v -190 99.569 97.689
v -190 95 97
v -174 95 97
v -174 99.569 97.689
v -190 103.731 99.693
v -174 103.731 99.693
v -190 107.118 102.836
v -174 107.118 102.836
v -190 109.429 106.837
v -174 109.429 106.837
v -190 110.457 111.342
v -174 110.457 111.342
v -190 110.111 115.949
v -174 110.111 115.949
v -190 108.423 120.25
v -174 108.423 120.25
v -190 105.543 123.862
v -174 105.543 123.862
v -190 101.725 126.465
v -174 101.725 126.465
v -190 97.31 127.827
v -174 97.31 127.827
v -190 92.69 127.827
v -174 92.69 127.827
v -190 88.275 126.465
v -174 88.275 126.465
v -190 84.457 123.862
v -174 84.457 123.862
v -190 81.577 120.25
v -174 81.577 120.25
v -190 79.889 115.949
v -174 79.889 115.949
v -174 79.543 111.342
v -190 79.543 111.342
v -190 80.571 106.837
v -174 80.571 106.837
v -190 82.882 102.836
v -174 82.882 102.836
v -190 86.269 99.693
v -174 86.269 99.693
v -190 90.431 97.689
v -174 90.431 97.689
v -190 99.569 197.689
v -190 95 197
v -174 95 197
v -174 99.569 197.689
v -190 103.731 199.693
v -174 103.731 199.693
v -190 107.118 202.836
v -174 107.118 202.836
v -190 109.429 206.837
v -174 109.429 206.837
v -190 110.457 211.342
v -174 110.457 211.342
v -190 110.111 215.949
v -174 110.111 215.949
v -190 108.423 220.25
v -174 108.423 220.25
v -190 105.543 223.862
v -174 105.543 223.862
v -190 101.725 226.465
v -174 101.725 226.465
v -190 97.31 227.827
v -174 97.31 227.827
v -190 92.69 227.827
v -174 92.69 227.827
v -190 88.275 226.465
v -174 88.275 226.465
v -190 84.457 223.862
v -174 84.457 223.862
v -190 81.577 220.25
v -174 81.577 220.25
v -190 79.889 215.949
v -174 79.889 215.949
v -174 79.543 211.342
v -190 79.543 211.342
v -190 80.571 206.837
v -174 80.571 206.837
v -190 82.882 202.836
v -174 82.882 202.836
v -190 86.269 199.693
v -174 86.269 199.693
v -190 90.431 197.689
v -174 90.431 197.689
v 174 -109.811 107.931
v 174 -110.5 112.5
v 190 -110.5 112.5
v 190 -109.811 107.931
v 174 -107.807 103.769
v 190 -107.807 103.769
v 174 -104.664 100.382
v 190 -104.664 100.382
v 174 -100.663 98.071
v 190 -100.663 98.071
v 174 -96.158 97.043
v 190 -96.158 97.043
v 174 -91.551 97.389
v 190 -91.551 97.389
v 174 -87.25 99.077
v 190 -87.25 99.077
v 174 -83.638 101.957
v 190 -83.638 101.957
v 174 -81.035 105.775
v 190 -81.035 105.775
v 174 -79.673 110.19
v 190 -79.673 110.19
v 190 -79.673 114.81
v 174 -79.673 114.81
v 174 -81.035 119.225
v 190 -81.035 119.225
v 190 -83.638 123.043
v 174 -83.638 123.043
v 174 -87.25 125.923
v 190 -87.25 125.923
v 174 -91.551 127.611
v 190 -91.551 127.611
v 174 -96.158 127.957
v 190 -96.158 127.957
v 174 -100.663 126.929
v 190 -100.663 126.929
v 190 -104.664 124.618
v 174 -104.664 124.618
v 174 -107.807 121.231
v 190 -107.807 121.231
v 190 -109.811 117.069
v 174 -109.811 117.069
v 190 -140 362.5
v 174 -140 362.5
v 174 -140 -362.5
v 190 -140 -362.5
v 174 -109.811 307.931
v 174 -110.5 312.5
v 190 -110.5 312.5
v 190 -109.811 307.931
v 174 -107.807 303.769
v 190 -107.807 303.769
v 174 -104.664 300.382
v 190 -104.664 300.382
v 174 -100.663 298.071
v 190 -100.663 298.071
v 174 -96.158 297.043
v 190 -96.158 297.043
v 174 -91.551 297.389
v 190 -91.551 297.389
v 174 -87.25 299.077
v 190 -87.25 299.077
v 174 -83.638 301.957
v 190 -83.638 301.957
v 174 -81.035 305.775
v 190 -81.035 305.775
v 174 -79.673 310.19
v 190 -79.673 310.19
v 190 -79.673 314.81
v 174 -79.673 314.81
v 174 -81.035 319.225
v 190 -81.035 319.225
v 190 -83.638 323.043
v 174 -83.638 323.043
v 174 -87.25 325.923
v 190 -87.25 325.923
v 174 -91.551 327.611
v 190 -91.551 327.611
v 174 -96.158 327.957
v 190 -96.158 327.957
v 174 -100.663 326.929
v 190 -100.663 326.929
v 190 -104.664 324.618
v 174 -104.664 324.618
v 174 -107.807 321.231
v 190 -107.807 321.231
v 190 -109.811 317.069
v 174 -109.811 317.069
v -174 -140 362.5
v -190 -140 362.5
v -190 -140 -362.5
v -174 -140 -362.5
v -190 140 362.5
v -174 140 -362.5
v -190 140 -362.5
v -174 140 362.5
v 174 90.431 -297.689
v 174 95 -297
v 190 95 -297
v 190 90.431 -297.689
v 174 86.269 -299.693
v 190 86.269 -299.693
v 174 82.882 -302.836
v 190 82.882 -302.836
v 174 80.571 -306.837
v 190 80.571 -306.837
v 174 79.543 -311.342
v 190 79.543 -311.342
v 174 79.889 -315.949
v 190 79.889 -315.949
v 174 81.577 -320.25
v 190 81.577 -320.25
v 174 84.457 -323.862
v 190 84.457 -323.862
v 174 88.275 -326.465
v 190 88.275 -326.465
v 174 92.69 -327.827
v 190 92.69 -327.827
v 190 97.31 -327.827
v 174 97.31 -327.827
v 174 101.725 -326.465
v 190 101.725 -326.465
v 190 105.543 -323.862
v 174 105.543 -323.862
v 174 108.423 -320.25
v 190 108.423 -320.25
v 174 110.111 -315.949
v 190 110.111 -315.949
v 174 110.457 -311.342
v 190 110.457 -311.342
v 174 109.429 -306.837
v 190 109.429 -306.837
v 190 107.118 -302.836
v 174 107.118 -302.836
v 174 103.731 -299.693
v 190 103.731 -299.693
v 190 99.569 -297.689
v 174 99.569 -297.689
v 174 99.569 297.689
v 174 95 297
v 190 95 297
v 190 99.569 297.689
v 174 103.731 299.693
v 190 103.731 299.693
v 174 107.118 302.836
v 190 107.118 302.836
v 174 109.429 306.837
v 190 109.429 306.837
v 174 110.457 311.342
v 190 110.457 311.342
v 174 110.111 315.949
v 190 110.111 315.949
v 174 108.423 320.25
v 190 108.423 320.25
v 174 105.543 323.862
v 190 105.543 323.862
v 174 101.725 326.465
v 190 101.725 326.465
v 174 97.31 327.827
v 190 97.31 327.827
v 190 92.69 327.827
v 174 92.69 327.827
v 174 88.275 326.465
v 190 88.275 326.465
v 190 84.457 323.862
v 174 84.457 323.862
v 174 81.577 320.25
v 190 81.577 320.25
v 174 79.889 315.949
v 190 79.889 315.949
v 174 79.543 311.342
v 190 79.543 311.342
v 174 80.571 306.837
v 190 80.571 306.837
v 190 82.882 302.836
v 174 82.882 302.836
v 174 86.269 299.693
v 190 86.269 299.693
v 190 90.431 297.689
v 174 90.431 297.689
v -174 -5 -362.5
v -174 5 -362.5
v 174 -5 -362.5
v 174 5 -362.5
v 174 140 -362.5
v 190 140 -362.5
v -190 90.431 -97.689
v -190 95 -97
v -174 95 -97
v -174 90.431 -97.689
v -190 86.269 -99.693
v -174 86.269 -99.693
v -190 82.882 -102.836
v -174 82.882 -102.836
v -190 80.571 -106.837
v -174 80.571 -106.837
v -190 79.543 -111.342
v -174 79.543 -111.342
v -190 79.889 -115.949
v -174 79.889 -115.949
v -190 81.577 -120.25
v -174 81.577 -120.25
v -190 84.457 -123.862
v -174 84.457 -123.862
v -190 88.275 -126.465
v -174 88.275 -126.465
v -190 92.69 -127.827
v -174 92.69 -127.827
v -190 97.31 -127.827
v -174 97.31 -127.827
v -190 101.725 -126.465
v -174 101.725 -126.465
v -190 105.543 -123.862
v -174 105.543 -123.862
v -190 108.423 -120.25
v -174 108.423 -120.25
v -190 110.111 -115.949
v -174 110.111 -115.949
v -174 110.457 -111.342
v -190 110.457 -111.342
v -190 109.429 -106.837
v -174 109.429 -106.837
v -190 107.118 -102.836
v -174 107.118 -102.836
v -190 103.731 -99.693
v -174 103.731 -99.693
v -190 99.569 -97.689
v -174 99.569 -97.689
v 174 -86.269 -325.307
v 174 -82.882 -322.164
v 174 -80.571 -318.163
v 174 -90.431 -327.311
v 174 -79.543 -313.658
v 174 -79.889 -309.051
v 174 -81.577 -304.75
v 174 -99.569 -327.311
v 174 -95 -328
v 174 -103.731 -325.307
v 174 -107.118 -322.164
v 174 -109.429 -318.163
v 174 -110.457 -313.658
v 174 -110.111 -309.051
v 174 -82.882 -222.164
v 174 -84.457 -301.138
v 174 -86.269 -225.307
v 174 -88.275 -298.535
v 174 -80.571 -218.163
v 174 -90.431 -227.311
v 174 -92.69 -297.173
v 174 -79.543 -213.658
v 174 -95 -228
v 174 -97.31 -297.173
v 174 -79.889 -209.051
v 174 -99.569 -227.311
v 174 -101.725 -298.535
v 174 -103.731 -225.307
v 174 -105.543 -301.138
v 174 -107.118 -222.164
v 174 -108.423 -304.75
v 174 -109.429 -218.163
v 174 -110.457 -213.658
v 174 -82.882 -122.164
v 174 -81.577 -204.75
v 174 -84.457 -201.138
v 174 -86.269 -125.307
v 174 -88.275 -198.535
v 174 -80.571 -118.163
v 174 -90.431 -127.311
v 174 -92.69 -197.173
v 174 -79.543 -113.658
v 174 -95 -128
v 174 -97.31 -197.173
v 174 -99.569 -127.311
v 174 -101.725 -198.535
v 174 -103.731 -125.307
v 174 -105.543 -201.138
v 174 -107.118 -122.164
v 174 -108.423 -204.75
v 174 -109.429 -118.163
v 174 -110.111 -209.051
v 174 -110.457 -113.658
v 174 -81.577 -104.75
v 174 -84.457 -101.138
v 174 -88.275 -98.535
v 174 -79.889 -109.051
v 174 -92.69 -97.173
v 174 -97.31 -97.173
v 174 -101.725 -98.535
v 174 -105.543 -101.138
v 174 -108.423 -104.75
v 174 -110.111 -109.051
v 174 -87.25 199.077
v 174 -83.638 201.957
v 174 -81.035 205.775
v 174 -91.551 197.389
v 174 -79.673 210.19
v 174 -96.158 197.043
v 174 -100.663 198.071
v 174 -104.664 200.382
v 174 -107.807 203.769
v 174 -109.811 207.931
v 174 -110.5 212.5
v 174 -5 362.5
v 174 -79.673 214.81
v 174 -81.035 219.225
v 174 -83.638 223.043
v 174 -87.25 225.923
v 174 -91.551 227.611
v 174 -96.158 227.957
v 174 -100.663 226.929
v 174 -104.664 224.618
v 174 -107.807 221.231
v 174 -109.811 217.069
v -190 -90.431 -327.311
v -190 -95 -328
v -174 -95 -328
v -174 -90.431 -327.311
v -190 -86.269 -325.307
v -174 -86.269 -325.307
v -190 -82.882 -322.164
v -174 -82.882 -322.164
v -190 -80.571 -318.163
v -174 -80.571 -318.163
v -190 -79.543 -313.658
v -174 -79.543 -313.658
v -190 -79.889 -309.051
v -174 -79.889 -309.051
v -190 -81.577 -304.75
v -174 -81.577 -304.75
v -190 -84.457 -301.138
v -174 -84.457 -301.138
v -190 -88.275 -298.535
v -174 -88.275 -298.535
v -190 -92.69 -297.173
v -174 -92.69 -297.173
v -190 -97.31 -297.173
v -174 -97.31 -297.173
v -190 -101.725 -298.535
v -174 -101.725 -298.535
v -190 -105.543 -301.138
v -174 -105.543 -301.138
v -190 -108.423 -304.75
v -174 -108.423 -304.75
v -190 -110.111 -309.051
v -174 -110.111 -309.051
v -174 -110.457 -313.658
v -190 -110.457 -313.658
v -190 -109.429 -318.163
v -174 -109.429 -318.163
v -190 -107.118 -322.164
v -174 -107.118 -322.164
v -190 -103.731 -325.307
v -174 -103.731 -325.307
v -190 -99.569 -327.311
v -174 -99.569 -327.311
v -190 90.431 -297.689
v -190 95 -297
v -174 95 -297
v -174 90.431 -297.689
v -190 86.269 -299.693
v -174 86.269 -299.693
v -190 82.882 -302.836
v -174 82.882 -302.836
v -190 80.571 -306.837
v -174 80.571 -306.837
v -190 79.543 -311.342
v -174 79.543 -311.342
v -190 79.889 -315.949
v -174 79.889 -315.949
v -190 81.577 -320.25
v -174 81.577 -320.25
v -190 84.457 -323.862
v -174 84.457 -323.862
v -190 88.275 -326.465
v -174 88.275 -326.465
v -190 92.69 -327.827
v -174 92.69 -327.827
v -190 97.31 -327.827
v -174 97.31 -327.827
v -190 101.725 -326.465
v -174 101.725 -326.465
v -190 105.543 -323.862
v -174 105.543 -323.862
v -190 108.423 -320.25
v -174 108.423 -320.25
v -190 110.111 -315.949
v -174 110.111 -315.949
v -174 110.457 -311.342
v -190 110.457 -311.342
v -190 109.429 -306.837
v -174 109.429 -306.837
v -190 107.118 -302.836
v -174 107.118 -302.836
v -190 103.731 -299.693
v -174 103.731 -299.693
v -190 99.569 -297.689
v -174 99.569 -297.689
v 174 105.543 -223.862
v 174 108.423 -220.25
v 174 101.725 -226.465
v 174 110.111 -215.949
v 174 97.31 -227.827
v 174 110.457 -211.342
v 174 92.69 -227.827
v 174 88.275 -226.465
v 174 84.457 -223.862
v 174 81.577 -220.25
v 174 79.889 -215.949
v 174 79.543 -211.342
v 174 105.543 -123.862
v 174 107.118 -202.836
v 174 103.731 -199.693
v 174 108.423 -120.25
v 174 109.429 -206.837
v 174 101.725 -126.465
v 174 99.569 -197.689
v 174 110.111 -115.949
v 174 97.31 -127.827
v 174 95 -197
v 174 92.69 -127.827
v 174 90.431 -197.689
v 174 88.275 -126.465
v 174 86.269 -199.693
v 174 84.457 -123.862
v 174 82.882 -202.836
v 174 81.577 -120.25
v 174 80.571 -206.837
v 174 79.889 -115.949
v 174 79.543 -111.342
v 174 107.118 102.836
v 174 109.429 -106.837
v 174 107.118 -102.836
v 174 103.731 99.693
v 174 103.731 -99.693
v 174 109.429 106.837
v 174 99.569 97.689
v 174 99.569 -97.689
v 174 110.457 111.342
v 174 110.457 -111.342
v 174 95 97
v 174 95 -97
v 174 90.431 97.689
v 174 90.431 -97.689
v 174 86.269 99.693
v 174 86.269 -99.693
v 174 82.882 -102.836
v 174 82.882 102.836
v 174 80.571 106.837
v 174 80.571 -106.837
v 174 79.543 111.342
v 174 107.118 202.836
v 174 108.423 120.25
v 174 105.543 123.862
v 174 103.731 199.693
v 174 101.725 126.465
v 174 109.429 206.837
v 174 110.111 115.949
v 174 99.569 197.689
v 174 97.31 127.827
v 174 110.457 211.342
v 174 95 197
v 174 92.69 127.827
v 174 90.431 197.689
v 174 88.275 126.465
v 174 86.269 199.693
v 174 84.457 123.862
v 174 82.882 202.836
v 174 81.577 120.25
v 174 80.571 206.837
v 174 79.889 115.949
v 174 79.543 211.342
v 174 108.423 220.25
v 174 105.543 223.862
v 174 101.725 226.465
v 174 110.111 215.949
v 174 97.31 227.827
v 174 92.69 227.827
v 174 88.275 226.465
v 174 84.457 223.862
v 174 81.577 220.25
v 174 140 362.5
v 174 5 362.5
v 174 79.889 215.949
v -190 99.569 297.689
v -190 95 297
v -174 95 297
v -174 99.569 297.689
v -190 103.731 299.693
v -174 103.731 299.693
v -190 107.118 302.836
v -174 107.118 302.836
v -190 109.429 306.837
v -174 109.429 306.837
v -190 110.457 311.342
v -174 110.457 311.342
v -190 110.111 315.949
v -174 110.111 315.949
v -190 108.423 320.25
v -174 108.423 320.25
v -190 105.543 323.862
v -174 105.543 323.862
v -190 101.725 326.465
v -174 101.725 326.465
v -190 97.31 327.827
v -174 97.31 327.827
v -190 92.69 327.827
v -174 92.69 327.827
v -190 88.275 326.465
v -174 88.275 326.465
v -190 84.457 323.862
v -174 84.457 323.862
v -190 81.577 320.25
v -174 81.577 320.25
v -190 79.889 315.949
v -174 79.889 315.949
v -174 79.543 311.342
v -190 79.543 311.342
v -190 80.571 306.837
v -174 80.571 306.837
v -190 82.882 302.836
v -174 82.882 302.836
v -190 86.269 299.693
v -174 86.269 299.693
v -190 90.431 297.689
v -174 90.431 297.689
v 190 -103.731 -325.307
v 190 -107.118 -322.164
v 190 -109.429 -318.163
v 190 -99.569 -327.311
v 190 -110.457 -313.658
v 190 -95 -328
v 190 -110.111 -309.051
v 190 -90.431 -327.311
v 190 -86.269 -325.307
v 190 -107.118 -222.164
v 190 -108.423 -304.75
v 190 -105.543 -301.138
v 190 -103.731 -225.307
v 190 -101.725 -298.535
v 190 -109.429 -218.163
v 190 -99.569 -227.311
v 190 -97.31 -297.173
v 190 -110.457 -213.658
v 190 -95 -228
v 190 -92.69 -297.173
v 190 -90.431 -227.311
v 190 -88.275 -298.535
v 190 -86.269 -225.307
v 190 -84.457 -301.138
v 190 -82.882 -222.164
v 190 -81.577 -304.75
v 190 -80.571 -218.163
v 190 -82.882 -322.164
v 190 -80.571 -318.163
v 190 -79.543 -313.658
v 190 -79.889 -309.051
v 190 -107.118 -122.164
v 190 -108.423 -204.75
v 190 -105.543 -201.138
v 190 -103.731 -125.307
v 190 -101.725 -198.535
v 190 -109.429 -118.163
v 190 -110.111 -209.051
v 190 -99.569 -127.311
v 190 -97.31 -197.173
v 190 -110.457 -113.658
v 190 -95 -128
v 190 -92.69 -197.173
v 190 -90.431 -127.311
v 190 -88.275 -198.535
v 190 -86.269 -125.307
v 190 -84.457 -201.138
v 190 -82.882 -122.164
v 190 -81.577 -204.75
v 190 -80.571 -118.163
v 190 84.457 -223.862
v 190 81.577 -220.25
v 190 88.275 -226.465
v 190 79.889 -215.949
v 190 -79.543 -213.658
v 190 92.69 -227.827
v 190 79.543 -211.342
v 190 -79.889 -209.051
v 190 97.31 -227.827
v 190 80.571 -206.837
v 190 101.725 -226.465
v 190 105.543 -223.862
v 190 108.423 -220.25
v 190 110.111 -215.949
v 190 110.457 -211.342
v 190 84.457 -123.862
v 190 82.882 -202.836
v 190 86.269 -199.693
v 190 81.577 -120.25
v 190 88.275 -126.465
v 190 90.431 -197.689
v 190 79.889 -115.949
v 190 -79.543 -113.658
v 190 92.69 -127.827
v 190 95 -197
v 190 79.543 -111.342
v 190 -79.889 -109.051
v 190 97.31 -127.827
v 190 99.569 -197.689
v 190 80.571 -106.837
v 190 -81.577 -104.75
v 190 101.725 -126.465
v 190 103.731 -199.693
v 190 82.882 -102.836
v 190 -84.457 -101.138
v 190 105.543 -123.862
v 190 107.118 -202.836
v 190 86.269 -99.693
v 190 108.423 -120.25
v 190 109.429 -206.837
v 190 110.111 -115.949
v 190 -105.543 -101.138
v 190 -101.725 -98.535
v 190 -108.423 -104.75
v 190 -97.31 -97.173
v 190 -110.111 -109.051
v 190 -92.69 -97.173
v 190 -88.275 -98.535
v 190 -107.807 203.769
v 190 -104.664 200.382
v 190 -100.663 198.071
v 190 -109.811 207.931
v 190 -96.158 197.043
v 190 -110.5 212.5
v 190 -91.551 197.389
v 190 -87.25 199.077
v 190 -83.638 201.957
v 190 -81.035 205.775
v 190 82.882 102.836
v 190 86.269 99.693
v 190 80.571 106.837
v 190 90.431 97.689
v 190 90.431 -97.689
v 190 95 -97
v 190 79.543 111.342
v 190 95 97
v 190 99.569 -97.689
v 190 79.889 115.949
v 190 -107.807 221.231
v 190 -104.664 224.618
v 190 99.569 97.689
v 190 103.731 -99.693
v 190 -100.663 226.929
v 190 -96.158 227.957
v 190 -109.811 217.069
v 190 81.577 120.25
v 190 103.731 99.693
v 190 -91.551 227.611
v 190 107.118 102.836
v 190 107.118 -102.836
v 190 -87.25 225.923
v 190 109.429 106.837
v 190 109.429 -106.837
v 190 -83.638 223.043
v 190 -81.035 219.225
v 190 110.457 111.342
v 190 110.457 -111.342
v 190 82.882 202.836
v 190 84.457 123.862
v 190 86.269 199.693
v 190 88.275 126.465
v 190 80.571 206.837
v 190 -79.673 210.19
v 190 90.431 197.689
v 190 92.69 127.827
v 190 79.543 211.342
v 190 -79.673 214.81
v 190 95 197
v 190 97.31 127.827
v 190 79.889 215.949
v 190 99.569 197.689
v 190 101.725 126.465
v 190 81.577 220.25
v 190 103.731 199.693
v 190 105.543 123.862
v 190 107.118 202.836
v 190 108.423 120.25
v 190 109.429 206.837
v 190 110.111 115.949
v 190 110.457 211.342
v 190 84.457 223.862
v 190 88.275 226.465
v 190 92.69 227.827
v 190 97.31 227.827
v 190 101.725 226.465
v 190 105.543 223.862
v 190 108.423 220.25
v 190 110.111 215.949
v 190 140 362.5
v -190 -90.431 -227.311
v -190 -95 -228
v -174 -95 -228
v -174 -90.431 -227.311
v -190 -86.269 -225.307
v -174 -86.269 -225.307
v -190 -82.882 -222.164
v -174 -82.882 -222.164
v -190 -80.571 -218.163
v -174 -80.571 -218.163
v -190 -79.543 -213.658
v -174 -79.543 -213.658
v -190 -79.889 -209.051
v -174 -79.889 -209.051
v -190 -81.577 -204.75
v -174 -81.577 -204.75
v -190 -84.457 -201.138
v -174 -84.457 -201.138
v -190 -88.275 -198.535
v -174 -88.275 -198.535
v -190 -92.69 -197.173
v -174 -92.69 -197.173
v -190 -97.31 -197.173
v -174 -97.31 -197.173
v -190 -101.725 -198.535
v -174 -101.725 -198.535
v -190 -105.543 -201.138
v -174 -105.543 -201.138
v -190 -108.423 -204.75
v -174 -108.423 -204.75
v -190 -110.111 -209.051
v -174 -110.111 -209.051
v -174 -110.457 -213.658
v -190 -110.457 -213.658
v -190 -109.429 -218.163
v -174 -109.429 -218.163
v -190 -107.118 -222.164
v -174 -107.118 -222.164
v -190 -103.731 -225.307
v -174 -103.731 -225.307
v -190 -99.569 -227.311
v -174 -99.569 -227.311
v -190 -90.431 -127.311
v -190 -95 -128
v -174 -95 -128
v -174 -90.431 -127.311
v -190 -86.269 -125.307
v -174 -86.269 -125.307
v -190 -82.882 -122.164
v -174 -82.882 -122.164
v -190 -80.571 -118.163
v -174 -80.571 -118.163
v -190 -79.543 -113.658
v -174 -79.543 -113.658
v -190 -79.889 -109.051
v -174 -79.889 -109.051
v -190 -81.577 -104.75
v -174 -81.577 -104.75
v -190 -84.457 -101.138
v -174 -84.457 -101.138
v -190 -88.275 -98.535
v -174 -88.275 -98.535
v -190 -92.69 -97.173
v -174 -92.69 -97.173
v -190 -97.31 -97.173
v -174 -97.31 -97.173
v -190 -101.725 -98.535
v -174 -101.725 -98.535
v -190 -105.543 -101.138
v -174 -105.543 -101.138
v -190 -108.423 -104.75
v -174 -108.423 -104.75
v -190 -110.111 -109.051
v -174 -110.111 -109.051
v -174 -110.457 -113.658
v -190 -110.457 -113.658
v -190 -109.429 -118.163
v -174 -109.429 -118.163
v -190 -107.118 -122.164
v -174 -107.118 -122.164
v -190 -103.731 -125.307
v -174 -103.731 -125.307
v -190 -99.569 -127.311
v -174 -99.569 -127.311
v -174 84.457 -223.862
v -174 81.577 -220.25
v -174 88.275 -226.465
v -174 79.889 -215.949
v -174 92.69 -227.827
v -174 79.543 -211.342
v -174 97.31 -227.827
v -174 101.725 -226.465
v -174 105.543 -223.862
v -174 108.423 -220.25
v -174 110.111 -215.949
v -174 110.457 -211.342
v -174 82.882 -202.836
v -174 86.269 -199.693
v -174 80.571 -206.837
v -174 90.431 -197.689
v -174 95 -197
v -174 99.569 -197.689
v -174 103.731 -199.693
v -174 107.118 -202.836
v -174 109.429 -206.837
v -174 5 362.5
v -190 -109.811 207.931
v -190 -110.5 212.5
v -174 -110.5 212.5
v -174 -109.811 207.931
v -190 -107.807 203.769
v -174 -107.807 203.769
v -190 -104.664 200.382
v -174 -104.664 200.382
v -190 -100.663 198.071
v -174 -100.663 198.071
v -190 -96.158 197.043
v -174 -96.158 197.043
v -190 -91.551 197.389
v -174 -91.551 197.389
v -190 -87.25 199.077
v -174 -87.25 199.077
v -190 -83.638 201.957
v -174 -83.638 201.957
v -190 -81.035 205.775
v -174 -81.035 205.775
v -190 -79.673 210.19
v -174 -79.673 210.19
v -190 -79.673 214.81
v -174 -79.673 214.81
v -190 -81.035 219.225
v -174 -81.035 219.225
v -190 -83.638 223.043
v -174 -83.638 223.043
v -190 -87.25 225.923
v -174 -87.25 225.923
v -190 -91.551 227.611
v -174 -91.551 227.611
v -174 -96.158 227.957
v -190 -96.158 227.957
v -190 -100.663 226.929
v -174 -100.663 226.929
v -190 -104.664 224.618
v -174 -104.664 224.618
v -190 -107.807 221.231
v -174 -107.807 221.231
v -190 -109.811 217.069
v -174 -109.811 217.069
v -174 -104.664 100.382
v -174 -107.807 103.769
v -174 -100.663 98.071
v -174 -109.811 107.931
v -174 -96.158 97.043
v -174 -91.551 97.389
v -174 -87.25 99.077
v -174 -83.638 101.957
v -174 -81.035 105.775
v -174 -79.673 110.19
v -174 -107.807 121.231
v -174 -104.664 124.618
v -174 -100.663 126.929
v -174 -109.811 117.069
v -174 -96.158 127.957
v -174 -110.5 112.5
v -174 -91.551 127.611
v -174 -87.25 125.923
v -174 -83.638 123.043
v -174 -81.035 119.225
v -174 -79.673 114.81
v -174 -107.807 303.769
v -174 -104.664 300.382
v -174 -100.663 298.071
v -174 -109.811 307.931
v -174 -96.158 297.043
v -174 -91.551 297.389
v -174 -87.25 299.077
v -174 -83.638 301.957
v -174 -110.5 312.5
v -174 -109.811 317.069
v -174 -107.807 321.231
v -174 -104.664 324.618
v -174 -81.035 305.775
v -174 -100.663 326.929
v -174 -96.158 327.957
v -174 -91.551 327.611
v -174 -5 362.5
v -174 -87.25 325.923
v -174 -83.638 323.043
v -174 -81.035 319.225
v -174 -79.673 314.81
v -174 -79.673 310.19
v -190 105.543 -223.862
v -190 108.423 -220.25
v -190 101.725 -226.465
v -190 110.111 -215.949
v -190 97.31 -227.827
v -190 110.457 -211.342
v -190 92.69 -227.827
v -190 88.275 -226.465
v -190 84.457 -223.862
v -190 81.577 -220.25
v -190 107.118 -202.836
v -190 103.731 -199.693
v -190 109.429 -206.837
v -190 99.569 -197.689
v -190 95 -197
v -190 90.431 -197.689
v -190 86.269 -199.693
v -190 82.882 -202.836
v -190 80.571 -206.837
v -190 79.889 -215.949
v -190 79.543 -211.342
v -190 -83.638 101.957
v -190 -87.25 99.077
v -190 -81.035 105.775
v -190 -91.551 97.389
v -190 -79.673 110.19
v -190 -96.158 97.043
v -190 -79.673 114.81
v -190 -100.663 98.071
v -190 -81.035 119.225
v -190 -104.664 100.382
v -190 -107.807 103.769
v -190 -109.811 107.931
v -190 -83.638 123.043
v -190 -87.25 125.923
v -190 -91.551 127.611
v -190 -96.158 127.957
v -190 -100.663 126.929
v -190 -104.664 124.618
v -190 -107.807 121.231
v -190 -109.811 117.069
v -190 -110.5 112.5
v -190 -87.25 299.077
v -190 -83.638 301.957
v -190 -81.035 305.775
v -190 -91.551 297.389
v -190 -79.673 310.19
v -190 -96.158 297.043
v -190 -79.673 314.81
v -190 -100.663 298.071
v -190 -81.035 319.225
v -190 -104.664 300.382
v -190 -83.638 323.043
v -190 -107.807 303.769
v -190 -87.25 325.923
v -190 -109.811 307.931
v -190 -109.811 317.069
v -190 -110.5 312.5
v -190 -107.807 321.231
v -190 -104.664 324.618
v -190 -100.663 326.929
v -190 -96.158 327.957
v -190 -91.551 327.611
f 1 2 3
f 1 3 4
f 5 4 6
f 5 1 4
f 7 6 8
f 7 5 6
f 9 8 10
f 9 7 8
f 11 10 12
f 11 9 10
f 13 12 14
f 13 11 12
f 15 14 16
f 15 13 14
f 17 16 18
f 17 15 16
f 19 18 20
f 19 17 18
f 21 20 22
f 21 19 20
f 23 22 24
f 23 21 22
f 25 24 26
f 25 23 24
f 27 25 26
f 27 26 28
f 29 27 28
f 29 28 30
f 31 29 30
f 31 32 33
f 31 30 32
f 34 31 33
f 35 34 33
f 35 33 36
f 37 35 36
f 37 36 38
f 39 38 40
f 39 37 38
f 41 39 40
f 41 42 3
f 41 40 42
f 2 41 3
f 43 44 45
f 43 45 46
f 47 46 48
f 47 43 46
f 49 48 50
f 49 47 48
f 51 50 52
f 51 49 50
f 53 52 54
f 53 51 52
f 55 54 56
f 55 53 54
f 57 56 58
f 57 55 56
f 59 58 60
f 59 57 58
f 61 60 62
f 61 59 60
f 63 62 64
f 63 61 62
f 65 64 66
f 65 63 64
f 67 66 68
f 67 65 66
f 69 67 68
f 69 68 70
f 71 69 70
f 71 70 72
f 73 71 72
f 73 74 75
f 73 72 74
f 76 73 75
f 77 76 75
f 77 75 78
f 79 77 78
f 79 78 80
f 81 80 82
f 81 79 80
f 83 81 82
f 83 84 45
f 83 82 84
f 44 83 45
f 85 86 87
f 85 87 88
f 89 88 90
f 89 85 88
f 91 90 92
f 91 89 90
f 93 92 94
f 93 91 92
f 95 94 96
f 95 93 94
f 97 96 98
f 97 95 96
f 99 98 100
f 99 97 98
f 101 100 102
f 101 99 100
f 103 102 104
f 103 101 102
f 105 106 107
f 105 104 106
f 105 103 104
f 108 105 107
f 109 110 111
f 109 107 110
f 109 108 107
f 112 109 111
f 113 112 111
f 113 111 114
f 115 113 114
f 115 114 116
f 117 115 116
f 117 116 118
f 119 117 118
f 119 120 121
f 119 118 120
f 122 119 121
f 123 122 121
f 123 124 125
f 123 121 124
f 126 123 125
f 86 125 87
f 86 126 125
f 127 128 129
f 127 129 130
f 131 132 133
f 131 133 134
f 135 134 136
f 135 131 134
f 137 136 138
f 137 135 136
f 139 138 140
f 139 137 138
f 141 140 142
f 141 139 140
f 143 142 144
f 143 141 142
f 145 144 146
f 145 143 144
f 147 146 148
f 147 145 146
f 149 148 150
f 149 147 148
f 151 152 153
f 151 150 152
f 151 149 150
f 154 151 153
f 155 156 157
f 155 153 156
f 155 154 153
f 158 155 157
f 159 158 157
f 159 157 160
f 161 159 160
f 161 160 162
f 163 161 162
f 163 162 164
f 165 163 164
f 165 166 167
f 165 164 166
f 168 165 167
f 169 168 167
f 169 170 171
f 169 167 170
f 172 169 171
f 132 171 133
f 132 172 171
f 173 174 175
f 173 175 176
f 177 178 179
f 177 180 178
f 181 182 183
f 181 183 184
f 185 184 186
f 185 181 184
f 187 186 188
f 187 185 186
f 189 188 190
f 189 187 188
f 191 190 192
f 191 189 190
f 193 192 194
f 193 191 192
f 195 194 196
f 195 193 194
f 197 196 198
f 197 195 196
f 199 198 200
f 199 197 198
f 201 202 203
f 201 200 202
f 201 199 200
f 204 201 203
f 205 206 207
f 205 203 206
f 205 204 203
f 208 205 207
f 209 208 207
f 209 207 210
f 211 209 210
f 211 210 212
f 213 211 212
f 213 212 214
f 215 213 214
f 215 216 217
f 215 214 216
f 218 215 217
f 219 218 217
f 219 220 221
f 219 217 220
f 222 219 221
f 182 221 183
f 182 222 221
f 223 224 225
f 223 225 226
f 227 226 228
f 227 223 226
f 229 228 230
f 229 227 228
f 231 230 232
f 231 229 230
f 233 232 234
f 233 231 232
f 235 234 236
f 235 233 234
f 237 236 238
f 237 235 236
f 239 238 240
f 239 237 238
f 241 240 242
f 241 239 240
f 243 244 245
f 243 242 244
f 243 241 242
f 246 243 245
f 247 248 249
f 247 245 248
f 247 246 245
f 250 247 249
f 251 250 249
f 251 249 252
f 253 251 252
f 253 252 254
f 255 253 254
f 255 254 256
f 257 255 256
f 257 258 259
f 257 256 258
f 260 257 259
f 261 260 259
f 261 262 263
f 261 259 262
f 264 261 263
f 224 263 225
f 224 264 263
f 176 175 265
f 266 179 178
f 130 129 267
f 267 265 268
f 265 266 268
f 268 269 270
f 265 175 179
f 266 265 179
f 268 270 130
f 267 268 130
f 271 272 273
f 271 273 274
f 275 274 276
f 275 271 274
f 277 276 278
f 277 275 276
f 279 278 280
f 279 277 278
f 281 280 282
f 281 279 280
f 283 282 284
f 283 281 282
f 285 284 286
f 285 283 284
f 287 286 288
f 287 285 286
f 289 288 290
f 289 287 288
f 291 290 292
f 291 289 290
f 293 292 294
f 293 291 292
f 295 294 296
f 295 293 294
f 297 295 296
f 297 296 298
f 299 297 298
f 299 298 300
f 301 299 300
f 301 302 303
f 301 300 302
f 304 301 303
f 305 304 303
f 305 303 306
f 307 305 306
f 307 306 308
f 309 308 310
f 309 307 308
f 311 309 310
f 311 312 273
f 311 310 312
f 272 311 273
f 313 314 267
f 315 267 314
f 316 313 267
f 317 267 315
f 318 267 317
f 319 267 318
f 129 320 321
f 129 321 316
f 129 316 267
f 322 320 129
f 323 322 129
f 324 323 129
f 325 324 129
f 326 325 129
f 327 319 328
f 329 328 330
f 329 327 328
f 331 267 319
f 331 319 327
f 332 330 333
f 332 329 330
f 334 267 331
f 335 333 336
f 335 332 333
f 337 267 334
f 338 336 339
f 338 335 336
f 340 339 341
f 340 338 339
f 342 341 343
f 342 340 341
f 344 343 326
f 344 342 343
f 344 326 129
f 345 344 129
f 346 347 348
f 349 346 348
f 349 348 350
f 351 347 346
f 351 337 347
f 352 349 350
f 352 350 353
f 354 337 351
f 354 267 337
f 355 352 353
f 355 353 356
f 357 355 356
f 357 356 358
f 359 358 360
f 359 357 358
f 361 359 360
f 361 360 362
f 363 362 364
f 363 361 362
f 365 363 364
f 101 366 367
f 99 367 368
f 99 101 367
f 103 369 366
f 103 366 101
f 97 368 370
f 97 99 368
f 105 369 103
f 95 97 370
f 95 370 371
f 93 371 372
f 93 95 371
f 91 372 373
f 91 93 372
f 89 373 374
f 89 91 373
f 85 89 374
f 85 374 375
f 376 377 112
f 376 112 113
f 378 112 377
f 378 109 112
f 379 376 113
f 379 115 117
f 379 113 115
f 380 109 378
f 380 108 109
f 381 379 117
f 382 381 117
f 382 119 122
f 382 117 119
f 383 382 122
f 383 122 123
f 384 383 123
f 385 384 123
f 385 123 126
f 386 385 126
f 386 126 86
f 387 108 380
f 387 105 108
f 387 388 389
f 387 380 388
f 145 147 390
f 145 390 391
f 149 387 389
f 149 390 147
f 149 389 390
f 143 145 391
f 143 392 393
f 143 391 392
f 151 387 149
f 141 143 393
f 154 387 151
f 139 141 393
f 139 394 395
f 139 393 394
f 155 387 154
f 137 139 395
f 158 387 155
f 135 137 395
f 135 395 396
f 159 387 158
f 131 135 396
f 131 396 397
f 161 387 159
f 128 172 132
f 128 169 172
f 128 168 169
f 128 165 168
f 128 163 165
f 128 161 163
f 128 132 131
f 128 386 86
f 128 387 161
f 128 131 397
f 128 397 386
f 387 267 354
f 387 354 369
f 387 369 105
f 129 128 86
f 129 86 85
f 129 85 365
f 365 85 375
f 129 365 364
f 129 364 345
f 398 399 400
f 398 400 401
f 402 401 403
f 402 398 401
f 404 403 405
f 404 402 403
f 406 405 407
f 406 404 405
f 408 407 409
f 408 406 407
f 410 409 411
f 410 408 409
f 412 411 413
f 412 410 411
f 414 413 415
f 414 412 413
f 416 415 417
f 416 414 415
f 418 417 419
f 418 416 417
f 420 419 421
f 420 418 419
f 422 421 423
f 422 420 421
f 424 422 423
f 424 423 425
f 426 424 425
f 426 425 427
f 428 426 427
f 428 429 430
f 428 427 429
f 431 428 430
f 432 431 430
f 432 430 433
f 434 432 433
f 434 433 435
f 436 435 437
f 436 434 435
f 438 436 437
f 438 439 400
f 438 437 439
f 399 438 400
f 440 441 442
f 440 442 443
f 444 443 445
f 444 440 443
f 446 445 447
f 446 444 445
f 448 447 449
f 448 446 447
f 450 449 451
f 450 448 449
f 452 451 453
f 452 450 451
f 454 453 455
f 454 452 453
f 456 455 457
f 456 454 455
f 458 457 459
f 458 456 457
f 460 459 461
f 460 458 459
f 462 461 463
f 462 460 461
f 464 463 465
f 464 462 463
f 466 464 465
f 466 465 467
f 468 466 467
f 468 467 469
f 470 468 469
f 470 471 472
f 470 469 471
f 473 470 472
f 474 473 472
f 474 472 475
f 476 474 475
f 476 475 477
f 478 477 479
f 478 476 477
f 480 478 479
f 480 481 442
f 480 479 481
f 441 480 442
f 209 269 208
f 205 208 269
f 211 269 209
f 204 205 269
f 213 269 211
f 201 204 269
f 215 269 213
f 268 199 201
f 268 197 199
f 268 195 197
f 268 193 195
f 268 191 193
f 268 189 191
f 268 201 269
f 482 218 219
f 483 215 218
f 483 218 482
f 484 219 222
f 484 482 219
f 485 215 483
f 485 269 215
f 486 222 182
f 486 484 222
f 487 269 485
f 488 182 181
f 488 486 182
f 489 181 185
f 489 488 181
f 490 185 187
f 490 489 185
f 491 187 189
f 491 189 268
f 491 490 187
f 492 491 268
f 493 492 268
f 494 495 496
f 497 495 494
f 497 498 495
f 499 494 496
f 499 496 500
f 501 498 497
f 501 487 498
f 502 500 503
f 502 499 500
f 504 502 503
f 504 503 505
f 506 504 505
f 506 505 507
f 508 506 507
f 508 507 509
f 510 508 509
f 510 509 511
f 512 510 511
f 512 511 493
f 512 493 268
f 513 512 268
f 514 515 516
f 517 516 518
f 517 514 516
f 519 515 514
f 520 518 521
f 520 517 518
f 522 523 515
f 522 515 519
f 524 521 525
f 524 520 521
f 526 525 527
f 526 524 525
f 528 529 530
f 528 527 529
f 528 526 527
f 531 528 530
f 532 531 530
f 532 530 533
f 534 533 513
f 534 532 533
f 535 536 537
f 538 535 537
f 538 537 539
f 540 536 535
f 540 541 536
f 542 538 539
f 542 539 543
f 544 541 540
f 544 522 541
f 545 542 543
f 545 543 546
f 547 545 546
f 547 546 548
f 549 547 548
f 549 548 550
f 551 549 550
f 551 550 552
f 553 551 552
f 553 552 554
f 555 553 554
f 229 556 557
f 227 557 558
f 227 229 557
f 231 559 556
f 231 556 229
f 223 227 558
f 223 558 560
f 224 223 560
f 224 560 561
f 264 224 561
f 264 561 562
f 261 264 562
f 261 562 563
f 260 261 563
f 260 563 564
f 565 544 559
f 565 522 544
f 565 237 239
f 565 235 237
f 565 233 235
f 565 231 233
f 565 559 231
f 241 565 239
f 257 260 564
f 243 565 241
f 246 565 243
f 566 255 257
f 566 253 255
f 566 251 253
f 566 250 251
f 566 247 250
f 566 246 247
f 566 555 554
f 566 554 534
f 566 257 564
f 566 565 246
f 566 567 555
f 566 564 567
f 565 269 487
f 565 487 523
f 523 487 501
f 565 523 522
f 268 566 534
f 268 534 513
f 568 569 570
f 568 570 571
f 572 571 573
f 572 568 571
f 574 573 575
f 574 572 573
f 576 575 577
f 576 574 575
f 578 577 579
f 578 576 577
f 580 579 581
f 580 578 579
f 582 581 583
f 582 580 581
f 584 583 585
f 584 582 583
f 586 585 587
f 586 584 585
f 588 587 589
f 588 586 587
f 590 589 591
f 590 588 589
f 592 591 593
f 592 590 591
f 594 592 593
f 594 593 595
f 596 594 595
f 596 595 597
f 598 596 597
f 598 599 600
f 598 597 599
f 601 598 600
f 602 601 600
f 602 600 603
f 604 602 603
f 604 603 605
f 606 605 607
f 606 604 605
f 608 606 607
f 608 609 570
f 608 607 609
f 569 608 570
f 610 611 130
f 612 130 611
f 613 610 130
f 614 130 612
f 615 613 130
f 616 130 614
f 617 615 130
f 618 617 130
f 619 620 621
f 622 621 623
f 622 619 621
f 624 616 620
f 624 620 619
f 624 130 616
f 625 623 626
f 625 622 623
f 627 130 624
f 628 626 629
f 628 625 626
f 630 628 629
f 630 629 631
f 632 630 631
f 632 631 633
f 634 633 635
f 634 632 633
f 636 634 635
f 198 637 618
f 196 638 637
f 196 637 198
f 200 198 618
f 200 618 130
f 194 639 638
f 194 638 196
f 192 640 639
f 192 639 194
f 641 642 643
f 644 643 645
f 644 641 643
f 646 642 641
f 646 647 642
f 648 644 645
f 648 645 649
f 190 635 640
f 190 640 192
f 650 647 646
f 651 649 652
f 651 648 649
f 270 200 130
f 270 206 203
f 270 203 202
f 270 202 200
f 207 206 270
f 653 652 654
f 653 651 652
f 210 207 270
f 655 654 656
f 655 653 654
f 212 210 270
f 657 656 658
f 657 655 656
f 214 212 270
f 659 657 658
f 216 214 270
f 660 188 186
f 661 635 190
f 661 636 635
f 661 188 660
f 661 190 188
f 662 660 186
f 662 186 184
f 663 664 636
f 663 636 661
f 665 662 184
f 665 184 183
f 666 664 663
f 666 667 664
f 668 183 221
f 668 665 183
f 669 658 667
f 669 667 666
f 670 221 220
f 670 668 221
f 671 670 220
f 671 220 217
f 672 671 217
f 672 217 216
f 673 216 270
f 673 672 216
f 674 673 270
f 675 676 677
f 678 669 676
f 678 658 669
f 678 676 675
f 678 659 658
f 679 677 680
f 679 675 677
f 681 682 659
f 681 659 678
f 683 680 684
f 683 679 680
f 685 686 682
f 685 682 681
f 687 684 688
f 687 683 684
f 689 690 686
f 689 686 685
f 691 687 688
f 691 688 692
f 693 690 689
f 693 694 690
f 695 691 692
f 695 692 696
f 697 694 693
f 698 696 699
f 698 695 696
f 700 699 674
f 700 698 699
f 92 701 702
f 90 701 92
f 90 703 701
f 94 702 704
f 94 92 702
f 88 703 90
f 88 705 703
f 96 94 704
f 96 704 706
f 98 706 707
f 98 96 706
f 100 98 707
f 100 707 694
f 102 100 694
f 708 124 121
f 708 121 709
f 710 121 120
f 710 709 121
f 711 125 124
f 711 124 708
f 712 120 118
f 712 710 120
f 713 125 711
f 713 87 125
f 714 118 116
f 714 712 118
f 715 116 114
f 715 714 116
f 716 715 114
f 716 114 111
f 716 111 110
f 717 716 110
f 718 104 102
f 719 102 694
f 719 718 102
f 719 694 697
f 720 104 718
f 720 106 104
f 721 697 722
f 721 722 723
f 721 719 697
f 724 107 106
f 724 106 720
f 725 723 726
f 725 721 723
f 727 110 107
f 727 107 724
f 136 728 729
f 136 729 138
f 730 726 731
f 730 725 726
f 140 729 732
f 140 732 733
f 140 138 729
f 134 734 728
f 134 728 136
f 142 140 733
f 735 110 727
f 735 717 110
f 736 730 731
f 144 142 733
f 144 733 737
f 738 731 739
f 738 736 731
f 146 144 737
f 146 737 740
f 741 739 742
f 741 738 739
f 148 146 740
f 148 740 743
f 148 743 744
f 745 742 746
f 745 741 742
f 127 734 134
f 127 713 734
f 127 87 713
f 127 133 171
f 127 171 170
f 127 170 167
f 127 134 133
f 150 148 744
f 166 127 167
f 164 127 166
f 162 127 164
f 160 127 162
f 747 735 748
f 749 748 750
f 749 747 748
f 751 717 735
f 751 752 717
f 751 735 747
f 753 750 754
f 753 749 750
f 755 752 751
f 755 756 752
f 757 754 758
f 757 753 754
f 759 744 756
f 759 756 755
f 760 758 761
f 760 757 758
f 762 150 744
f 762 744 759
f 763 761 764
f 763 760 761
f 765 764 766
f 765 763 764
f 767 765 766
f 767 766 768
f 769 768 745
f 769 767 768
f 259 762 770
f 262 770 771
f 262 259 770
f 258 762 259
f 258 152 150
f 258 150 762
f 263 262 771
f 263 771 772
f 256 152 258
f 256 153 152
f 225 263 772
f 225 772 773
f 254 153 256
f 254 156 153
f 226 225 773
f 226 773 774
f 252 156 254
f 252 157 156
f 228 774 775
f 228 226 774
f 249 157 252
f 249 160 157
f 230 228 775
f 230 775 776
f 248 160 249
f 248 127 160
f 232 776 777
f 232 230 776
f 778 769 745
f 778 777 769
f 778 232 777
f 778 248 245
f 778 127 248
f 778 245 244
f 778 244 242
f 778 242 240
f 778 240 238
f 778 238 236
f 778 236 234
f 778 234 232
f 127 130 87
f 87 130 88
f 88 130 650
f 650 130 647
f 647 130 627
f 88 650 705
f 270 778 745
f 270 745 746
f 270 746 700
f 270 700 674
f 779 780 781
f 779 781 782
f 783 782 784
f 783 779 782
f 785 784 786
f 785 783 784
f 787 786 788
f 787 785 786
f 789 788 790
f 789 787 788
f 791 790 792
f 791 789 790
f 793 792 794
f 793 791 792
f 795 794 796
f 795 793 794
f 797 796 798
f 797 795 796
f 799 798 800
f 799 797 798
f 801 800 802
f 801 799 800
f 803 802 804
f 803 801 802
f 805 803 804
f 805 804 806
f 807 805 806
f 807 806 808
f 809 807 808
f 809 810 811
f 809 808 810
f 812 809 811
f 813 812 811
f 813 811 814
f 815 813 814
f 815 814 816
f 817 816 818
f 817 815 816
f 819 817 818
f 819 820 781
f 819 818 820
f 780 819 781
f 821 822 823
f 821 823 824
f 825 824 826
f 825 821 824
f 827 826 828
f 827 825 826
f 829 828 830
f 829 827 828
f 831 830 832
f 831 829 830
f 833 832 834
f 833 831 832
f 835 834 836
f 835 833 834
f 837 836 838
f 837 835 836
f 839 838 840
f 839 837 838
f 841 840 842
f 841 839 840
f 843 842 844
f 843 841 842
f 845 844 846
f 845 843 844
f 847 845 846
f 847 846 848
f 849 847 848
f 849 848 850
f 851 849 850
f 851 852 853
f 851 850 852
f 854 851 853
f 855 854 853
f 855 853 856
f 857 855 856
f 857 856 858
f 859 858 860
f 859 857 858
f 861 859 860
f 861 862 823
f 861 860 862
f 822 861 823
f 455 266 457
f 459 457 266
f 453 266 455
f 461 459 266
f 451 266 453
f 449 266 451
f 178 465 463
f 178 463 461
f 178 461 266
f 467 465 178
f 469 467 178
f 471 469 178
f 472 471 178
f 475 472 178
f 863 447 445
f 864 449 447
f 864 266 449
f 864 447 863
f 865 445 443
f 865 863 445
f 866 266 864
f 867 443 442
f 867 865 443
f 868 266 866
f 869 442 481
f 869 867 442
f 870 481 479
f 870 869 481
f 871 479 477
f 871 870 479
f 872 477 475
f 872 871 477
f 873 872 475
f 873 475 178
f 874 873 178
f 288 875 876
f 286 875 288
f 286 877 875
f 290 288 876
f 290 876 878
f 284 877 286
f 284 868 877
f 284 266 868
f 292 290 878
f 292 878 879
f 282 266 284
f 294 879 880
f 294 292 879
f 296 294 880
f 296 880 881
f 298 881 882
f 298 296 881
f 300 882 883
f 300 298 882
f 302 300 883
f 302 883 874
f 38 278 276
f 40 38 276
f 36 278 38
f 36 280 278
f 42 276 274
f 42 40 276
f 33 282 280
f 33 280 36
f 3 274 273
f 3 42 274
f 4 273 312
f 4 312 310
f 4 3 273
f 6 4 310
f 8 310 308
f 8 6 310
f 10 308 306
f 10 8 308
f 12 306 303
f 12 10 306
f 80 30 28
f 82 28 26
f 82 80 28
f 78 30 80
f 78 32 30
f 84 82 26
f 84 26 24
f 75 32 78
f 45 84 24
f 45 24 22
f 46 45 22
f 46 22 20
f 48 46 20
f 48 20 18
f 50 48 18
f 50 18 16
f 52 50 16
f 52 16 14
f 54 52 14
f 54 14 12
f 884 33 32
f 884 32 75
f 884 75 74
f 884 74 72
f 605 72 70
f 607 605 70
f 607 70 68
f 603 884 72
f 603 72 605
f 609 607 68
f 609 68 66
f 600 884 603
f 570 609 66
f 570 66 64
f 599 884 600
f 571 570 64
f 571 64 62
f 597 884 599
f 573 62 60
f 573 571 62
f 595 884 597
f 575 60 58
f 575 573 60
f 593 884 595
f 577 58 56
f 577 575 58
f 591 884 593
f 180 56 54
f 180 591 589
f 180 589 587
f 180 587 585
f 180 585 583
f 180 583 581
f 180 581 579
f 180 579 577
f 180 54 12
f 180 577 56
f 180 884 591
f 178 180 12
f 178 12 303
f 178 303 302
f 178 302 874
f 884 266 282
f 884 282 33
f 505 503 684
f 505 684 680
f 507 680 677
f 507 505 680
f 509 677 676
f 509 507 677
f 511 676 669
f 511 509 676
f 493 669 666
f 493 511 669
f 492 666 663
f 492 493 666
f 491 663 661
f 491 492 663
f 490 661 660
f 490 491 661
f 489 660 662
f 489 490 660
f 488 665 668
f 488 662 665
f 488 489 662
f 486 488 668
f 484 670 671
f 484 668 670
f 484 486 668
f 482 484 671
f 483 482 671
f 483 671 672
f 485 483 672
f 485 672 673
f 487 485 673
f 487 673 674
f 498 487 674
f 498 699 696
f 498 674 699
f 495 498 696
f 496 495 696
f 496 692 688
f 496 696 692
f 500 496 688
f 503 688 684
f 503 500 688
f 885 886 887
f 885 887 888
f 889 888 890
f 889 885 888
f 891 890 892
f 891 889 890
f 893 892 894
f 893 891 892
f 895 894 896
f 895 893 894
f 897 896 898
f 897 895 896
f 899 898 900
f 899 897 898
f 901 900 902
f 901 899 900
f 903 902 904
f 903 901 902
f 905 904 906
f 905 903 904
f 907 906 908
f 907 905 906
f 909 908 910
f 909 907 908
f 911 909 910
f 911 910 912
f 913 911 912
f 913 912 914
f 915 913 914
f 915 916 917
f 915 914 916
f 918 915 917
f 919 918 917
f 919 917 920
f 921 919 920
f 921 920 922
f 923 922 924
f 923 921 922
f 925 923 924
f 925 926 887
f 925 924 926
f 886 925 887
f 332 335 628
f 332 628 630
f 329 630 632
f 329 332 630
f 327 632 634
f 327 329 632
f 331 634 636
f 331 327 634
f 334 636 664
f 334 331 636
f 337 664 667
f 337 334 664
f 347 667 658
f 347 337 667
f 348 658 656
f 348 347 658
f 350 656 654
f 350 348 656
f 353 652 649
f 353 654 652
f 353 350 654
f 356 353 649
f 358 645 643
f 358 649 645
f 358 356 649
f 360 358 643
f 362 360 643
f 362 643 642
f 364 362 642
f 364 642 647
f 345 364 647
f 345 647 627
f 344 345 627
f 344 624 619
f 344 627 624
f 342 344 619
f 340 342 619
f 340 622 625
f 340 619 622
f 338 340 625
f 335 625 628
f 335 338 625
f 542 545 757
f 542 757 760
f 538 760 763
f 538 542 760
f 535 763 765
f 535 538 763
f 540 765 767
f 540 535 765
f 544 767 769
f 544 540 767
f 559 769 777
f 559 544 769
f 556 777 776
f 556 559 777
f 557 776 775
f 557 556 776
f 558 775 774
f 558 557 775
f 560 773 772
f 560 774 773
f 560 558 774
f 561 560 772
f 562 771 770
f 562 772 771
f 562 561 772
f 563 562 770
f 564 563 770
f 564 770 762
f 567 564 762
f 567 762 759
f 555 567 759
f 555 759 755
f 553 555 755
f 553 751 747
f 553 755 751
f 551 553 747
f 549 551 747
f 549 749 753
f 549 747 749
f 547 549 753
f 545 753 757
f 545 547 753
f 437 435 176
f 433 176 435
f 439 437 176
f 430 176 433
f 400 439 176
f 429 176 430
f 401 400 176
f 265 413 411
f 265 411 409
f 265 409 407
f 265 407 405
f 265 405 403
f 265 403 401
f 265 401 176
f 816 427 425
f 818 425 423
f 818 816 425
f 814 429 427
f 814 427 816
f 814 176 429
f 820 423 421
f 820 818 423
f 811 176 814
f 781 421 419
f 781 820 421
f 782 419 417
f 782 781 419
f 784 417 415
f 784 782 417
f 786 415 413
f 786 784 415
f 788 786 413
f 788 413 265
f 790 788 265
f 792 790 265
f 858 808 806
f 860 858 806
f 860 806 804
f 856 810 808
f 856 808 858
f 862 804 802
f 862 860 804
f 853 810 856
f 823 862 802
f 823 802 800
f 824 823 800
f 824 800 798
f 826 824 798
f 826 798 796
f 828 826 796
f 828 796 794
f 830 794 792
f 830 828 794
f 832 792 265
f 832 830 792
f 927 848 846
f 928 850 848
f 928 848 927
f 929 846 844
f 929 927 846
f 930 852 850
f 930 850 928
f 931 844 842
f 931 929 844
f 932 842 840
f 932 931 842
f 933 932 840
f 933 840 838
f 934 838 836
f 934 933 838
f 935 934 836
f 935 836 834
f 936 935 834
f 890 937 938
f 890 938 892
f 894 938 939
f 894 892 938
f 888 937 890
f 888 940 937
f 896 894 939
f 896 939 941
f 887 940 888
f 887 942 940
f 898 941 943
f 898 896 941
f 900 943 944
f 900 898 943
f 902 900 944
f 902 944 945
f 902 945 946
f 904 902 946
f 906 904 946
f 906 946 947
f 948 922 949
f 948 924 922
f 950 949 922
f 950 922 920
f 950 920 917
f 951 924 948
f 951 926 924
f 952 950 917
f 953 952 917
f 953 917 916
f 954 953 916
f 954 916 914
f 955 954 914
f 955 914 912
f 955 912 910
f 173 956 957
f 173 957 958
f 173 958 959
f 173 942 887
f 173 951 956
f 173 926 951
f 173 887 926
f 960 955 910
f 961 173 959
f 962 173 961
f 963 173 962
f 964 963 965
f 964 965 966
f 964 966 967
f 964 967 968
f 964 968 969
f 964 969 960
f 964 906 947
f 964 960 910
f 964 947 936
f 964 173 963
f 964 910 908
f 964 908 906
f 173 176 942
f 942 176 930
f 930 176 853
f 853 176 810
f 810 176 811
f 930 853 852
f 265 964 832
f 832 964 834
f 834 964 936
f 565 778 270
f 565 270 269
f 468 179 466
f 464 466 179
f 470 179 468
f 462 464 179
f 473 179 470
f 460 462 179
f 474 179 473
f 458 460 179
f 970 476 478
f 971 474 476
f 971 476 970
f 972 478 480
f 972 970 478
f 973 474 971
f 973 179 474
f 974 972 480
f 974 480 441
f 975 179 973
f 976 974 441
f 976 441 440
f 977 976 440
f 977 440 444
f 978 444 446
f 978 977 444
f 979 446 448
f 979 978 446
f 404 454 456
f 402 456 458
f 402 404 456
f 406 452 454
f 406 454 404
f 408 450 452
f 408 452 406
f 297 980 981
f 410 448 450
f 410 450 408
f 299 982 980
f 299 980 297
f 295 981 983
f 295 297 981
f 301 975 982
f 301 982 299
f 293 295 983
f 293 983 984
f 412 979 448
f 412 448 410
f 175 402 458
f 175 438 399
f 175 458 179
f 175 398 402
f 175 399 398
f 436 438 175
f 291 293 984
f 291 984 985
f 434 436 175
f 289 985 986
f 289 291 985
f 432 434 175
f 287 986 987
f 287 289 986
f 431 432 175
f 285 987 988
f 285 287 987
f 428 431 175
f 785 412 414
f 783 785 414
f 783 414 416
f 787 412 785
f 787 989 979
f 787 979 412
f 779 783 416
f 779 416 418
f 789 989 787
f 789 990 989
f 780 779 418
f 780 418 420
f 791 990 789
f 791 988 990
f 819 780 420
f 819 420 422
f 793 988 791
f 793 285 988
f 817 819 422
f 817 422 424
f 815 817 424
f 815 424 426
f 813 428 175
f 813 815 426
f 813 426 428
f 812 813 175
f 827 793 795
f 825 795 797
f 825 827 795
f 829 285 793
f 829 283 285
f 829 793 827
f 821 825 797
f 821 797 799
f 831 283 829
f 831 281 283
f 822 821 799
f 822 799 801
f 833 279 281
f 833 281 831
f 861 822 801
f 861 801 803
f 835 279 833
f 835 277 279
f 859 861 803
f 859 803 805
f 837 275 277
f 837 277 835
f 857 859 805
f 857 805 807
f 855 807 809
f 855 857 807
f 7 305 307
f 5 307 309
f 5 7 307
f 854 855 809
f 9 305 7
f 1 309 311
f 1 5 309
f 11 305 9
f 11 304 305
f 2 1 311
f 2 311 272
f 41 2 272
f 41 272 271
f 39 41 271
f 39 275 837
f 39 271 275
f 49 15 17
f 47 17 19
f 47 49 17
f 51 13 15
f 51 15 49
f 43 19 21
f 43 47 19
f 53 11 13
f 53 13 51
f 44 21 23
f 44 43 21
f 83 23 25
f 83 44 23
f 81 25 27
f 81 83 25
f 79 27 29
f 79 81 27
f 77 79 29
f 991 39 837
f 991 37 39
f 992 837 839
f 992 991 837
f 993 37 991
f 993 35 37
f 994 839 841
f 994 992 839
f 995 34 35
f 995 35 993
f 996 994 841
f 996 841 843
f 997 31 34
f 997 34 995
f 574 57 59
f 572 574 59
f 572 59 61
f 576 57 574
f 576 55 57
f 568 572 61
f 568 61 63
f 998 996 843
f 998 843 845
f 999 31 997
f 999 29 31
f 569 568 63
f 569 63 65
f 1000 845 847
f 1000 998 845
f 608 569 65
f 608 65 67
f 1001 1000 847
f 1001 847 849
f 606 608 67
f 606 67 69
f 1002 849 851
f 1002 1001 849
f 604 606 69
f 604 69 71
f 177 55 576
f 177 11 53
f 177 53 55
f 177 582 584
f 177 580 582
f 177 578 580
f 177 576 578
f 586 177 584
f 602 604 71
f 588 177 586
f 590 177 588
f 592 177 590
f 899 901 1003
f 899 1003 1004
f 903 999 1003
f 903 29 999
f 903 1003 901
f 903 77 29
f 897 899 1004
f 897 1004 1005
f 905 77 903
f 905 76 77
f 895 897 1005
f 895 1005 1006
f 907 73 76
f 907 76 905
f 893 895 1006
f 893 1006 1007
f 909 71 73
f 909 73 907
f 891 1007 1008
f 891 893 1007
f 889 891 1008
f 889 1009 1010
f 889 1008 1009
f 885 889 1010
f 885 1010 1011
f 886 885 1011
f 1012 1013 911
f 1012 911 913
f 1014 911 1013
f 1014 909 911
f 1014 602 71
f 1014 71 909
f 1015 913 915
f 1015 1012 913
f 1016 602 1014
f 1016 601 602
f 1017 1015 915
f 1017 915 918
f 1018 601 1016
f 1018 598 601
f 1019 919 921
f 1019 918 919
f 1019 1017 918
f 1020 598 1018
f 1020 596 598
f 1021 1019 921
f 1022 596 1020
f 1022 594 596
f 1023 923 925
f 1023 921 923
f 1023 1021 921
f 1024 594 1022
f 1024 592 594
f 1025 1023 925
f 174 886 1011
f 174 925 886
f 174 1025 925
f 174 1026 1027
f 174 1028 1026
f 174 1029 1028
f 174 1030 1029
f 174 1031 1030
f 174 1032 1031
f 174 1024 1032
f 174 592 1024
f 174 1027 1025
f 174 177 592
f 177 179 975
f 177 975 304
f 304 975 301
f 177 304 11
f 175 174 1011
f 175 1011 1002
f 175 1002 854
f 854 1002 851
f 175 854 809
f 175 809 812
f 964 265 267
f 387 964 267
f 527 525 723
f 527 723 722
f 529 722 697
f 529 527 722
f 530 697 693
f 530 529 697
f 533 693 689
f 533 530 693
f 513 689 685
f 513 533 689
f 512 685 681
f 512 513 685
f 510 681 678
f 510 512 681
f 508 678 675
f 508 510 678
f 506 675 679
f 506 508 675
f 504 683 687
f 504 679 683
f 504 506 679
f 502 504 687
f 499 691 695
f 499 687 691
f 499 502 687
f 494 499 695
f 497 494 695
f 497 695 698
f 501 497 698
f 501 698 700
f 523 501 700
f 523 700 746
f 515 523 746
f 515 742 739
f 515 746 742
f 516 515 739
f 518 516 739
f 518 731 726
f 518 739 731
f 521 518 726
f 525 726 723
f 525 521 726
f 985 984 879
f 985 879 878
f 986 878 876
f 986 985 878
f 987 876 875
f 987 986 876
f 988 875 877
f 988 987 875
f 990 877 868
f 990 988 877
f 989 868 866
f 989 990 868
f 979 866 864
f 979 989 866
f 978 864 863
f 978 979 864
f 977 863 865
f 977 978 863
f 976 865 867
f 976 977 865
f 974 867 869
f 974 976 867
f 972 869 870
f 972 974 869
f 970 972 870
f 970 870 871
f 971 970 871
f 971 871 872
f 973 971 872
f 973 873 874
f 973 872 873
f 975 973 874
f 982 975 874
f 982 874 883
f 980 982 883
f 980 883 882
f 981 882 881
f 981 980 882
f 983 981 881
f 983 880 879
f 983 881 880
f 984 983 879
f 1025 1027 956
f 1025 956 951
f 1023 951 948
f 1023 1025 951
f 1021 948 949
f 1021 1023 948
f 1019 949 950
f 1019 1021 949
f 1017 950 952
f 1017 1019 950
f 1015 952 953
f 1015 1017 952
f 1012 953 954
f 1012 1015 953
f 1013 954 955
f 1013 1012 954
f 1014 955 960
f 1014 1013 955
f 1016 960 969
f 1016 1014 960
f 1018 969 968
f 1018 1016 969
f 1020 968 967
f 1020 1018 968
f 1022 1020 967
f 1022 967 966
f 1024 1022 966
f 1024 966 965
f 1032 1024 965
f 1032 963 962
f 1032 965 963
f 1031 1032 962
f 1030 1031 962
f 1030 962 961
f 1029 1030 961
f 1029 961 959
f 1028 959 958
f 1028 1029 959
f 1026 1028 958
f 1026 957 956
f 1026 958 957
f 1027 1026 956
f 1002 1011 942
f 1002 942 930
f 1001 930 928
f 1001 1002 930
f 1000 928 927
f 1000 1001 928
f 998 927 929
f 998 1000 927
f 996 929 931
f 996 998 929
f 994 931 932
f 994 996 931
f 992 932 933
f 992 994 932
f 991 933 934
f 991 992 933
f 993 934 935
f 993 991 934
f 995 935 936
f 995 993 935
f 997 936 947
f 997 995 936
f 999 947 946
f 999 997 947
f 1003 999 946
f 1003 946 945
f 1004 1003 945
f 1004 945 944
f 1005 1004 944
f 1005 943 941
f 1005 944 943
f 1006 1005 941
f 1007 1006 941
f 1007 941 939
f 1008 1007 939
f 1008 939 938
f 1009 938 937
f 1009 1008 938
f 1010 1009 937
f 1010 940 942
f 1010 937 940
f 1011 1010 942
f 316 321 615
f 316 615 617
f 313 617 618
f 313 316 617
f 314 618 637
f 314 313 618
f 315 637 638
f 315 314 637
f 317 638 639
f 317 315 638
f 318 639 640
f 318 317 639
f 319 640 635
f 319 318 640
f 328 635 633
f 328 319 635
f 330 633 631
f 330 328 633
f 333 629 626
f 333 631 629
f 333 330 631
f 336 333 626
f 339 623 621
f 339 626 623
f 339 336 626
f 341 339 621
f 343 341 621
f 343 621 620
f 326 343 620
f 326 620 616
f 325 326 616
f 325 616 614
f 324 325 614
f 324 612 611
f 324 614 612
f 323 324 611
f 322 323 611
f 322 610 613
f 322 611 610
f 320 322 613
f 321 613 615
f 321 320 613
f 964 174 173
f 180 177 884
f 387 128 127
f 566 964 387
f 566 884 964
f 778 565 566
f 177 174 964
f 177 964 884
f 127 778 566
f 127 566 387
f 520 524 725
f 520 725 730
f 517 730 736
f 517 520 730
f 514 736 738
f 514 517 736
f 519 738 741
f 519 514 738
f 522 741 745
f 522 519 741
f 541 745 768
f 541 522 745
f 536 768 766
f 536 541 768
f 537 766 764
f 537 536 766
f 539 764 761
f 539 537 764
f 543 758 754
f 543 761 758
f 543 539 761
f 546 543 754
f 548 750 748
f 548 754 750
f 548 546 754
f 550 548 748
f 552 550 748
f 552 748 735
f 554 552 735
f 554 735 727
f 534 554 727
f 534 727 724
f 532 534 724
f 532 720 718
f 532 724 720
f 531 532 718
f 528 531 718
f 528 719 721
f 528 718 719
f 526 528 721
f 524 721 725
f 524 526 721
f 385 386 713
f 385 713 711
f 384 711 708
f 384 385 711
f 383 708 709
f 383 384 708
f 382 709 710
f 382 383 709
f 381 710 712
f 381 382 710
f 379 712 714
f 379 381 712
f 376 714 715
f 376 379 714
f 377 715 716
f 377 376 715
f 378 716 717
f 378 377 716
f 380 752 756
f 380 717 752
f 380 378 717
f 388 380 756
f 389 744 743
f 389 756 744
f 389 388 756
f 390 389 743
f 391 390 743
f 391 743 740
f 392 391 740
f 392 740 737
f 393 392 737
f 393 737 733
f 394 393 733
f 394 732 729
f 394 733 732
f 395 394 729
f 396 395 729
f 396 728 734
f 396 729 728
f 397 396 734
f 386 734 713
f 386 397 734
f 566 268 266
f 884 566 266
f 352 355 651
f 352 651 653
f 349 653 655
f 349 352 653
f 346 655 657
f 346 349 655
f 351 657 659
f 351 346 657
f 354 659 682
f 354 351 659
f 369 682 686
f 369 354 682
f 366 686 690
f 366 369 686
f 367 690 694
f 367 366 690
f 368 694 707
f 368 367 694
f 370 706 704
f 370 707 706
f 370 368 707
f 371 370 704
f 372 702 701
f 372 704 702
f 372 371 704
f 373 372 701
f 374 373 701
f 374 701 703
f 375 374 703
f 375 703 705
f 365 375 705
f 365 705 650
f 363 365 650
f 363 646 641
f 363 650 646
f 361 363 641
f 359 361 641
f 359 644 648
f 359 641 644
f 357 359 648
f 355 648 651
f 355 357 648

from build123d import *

# Parameters (mm, degrees)
EXTRUDE_1_DEPTH          = 362.5
CUT_EXTRUDE_2_DEPTH      = 433.557799606
CUT_EXTRUDE_2_DEPTH_BACK = 433.557799606
SKETCH_3_R               = 15.5


with BuildPart() as part:
    # 草图1 → 拉伸1 (new, symmetric)
    with BuildSketch(Plane.XY):
        Polygon((-174, 140), (-190, 140), (-190, -140), (-174, -140), (-174, -5), (174, -5), (174, -140), (190, -140), (190, 140), (174, 140), (174, 5), (-174, 5), align=None)
    extrude(amount=EXTRUDE_1_DEPTH, both=True)

    # 草图3 → 拉伸2 (cut, two sides: drawn at the far end of the back side and taken through both)
    with BuildSketch(Plane(origin=(0, 0, 0), x_dir=(0, 0, -1), z_dir=(1, 0, 0)).offset(-CUT_EXTRUDE_2_DEPTH_BACK)):
        with Locations((-312.5, 95)):
            Circle(SKETCH_3_R)
        with Locations((-212.5, 95)):
            Circle(SKETCH_3_R)
        with Locations((-112.5, 95)):
            Circle(SKETCH_3_R)
        with Locations(Location((-112.5, -95, 0), (0, 0, 270))):
            Circle(SKETCH_3_R)
        with Locations(Location((-212.5, -95, 0), (0, 0, 270))):
            Circle(SKETCH_3_R)
        with Locations(Location((-312.5, -95, 0), (0, 0, 270))):
            Circle(SKETCH_3_R)
        with Locations((312.5, -95)):
            Circle(SKETCH_3_R)
        with Locations((212.5, -95)):
            Circle(SKETCH_3_R)
        with Locations((112.5, -95)):
            Circle(SKETCH_3_R)
        with Locations(Location((112.5, 95, 0), (0, 0, 180))):
            Circle(SKETCH_3_R)
        with Locations(Location((212.5, 95, 0), (0, 0, 180))):
            Circle(SKETCH_3_R)
        with Locations(Location((312.5, 95, 0), (0, 0, 180))):
            Circle(SKETCH_3_R)
    extrude(amount=CUT_EXTRUDE_2_DEPTH + CUT_EXTRUDE_2_DEPTH_BACK, mode=Mode.SUBTRACT)


solid = part.part
